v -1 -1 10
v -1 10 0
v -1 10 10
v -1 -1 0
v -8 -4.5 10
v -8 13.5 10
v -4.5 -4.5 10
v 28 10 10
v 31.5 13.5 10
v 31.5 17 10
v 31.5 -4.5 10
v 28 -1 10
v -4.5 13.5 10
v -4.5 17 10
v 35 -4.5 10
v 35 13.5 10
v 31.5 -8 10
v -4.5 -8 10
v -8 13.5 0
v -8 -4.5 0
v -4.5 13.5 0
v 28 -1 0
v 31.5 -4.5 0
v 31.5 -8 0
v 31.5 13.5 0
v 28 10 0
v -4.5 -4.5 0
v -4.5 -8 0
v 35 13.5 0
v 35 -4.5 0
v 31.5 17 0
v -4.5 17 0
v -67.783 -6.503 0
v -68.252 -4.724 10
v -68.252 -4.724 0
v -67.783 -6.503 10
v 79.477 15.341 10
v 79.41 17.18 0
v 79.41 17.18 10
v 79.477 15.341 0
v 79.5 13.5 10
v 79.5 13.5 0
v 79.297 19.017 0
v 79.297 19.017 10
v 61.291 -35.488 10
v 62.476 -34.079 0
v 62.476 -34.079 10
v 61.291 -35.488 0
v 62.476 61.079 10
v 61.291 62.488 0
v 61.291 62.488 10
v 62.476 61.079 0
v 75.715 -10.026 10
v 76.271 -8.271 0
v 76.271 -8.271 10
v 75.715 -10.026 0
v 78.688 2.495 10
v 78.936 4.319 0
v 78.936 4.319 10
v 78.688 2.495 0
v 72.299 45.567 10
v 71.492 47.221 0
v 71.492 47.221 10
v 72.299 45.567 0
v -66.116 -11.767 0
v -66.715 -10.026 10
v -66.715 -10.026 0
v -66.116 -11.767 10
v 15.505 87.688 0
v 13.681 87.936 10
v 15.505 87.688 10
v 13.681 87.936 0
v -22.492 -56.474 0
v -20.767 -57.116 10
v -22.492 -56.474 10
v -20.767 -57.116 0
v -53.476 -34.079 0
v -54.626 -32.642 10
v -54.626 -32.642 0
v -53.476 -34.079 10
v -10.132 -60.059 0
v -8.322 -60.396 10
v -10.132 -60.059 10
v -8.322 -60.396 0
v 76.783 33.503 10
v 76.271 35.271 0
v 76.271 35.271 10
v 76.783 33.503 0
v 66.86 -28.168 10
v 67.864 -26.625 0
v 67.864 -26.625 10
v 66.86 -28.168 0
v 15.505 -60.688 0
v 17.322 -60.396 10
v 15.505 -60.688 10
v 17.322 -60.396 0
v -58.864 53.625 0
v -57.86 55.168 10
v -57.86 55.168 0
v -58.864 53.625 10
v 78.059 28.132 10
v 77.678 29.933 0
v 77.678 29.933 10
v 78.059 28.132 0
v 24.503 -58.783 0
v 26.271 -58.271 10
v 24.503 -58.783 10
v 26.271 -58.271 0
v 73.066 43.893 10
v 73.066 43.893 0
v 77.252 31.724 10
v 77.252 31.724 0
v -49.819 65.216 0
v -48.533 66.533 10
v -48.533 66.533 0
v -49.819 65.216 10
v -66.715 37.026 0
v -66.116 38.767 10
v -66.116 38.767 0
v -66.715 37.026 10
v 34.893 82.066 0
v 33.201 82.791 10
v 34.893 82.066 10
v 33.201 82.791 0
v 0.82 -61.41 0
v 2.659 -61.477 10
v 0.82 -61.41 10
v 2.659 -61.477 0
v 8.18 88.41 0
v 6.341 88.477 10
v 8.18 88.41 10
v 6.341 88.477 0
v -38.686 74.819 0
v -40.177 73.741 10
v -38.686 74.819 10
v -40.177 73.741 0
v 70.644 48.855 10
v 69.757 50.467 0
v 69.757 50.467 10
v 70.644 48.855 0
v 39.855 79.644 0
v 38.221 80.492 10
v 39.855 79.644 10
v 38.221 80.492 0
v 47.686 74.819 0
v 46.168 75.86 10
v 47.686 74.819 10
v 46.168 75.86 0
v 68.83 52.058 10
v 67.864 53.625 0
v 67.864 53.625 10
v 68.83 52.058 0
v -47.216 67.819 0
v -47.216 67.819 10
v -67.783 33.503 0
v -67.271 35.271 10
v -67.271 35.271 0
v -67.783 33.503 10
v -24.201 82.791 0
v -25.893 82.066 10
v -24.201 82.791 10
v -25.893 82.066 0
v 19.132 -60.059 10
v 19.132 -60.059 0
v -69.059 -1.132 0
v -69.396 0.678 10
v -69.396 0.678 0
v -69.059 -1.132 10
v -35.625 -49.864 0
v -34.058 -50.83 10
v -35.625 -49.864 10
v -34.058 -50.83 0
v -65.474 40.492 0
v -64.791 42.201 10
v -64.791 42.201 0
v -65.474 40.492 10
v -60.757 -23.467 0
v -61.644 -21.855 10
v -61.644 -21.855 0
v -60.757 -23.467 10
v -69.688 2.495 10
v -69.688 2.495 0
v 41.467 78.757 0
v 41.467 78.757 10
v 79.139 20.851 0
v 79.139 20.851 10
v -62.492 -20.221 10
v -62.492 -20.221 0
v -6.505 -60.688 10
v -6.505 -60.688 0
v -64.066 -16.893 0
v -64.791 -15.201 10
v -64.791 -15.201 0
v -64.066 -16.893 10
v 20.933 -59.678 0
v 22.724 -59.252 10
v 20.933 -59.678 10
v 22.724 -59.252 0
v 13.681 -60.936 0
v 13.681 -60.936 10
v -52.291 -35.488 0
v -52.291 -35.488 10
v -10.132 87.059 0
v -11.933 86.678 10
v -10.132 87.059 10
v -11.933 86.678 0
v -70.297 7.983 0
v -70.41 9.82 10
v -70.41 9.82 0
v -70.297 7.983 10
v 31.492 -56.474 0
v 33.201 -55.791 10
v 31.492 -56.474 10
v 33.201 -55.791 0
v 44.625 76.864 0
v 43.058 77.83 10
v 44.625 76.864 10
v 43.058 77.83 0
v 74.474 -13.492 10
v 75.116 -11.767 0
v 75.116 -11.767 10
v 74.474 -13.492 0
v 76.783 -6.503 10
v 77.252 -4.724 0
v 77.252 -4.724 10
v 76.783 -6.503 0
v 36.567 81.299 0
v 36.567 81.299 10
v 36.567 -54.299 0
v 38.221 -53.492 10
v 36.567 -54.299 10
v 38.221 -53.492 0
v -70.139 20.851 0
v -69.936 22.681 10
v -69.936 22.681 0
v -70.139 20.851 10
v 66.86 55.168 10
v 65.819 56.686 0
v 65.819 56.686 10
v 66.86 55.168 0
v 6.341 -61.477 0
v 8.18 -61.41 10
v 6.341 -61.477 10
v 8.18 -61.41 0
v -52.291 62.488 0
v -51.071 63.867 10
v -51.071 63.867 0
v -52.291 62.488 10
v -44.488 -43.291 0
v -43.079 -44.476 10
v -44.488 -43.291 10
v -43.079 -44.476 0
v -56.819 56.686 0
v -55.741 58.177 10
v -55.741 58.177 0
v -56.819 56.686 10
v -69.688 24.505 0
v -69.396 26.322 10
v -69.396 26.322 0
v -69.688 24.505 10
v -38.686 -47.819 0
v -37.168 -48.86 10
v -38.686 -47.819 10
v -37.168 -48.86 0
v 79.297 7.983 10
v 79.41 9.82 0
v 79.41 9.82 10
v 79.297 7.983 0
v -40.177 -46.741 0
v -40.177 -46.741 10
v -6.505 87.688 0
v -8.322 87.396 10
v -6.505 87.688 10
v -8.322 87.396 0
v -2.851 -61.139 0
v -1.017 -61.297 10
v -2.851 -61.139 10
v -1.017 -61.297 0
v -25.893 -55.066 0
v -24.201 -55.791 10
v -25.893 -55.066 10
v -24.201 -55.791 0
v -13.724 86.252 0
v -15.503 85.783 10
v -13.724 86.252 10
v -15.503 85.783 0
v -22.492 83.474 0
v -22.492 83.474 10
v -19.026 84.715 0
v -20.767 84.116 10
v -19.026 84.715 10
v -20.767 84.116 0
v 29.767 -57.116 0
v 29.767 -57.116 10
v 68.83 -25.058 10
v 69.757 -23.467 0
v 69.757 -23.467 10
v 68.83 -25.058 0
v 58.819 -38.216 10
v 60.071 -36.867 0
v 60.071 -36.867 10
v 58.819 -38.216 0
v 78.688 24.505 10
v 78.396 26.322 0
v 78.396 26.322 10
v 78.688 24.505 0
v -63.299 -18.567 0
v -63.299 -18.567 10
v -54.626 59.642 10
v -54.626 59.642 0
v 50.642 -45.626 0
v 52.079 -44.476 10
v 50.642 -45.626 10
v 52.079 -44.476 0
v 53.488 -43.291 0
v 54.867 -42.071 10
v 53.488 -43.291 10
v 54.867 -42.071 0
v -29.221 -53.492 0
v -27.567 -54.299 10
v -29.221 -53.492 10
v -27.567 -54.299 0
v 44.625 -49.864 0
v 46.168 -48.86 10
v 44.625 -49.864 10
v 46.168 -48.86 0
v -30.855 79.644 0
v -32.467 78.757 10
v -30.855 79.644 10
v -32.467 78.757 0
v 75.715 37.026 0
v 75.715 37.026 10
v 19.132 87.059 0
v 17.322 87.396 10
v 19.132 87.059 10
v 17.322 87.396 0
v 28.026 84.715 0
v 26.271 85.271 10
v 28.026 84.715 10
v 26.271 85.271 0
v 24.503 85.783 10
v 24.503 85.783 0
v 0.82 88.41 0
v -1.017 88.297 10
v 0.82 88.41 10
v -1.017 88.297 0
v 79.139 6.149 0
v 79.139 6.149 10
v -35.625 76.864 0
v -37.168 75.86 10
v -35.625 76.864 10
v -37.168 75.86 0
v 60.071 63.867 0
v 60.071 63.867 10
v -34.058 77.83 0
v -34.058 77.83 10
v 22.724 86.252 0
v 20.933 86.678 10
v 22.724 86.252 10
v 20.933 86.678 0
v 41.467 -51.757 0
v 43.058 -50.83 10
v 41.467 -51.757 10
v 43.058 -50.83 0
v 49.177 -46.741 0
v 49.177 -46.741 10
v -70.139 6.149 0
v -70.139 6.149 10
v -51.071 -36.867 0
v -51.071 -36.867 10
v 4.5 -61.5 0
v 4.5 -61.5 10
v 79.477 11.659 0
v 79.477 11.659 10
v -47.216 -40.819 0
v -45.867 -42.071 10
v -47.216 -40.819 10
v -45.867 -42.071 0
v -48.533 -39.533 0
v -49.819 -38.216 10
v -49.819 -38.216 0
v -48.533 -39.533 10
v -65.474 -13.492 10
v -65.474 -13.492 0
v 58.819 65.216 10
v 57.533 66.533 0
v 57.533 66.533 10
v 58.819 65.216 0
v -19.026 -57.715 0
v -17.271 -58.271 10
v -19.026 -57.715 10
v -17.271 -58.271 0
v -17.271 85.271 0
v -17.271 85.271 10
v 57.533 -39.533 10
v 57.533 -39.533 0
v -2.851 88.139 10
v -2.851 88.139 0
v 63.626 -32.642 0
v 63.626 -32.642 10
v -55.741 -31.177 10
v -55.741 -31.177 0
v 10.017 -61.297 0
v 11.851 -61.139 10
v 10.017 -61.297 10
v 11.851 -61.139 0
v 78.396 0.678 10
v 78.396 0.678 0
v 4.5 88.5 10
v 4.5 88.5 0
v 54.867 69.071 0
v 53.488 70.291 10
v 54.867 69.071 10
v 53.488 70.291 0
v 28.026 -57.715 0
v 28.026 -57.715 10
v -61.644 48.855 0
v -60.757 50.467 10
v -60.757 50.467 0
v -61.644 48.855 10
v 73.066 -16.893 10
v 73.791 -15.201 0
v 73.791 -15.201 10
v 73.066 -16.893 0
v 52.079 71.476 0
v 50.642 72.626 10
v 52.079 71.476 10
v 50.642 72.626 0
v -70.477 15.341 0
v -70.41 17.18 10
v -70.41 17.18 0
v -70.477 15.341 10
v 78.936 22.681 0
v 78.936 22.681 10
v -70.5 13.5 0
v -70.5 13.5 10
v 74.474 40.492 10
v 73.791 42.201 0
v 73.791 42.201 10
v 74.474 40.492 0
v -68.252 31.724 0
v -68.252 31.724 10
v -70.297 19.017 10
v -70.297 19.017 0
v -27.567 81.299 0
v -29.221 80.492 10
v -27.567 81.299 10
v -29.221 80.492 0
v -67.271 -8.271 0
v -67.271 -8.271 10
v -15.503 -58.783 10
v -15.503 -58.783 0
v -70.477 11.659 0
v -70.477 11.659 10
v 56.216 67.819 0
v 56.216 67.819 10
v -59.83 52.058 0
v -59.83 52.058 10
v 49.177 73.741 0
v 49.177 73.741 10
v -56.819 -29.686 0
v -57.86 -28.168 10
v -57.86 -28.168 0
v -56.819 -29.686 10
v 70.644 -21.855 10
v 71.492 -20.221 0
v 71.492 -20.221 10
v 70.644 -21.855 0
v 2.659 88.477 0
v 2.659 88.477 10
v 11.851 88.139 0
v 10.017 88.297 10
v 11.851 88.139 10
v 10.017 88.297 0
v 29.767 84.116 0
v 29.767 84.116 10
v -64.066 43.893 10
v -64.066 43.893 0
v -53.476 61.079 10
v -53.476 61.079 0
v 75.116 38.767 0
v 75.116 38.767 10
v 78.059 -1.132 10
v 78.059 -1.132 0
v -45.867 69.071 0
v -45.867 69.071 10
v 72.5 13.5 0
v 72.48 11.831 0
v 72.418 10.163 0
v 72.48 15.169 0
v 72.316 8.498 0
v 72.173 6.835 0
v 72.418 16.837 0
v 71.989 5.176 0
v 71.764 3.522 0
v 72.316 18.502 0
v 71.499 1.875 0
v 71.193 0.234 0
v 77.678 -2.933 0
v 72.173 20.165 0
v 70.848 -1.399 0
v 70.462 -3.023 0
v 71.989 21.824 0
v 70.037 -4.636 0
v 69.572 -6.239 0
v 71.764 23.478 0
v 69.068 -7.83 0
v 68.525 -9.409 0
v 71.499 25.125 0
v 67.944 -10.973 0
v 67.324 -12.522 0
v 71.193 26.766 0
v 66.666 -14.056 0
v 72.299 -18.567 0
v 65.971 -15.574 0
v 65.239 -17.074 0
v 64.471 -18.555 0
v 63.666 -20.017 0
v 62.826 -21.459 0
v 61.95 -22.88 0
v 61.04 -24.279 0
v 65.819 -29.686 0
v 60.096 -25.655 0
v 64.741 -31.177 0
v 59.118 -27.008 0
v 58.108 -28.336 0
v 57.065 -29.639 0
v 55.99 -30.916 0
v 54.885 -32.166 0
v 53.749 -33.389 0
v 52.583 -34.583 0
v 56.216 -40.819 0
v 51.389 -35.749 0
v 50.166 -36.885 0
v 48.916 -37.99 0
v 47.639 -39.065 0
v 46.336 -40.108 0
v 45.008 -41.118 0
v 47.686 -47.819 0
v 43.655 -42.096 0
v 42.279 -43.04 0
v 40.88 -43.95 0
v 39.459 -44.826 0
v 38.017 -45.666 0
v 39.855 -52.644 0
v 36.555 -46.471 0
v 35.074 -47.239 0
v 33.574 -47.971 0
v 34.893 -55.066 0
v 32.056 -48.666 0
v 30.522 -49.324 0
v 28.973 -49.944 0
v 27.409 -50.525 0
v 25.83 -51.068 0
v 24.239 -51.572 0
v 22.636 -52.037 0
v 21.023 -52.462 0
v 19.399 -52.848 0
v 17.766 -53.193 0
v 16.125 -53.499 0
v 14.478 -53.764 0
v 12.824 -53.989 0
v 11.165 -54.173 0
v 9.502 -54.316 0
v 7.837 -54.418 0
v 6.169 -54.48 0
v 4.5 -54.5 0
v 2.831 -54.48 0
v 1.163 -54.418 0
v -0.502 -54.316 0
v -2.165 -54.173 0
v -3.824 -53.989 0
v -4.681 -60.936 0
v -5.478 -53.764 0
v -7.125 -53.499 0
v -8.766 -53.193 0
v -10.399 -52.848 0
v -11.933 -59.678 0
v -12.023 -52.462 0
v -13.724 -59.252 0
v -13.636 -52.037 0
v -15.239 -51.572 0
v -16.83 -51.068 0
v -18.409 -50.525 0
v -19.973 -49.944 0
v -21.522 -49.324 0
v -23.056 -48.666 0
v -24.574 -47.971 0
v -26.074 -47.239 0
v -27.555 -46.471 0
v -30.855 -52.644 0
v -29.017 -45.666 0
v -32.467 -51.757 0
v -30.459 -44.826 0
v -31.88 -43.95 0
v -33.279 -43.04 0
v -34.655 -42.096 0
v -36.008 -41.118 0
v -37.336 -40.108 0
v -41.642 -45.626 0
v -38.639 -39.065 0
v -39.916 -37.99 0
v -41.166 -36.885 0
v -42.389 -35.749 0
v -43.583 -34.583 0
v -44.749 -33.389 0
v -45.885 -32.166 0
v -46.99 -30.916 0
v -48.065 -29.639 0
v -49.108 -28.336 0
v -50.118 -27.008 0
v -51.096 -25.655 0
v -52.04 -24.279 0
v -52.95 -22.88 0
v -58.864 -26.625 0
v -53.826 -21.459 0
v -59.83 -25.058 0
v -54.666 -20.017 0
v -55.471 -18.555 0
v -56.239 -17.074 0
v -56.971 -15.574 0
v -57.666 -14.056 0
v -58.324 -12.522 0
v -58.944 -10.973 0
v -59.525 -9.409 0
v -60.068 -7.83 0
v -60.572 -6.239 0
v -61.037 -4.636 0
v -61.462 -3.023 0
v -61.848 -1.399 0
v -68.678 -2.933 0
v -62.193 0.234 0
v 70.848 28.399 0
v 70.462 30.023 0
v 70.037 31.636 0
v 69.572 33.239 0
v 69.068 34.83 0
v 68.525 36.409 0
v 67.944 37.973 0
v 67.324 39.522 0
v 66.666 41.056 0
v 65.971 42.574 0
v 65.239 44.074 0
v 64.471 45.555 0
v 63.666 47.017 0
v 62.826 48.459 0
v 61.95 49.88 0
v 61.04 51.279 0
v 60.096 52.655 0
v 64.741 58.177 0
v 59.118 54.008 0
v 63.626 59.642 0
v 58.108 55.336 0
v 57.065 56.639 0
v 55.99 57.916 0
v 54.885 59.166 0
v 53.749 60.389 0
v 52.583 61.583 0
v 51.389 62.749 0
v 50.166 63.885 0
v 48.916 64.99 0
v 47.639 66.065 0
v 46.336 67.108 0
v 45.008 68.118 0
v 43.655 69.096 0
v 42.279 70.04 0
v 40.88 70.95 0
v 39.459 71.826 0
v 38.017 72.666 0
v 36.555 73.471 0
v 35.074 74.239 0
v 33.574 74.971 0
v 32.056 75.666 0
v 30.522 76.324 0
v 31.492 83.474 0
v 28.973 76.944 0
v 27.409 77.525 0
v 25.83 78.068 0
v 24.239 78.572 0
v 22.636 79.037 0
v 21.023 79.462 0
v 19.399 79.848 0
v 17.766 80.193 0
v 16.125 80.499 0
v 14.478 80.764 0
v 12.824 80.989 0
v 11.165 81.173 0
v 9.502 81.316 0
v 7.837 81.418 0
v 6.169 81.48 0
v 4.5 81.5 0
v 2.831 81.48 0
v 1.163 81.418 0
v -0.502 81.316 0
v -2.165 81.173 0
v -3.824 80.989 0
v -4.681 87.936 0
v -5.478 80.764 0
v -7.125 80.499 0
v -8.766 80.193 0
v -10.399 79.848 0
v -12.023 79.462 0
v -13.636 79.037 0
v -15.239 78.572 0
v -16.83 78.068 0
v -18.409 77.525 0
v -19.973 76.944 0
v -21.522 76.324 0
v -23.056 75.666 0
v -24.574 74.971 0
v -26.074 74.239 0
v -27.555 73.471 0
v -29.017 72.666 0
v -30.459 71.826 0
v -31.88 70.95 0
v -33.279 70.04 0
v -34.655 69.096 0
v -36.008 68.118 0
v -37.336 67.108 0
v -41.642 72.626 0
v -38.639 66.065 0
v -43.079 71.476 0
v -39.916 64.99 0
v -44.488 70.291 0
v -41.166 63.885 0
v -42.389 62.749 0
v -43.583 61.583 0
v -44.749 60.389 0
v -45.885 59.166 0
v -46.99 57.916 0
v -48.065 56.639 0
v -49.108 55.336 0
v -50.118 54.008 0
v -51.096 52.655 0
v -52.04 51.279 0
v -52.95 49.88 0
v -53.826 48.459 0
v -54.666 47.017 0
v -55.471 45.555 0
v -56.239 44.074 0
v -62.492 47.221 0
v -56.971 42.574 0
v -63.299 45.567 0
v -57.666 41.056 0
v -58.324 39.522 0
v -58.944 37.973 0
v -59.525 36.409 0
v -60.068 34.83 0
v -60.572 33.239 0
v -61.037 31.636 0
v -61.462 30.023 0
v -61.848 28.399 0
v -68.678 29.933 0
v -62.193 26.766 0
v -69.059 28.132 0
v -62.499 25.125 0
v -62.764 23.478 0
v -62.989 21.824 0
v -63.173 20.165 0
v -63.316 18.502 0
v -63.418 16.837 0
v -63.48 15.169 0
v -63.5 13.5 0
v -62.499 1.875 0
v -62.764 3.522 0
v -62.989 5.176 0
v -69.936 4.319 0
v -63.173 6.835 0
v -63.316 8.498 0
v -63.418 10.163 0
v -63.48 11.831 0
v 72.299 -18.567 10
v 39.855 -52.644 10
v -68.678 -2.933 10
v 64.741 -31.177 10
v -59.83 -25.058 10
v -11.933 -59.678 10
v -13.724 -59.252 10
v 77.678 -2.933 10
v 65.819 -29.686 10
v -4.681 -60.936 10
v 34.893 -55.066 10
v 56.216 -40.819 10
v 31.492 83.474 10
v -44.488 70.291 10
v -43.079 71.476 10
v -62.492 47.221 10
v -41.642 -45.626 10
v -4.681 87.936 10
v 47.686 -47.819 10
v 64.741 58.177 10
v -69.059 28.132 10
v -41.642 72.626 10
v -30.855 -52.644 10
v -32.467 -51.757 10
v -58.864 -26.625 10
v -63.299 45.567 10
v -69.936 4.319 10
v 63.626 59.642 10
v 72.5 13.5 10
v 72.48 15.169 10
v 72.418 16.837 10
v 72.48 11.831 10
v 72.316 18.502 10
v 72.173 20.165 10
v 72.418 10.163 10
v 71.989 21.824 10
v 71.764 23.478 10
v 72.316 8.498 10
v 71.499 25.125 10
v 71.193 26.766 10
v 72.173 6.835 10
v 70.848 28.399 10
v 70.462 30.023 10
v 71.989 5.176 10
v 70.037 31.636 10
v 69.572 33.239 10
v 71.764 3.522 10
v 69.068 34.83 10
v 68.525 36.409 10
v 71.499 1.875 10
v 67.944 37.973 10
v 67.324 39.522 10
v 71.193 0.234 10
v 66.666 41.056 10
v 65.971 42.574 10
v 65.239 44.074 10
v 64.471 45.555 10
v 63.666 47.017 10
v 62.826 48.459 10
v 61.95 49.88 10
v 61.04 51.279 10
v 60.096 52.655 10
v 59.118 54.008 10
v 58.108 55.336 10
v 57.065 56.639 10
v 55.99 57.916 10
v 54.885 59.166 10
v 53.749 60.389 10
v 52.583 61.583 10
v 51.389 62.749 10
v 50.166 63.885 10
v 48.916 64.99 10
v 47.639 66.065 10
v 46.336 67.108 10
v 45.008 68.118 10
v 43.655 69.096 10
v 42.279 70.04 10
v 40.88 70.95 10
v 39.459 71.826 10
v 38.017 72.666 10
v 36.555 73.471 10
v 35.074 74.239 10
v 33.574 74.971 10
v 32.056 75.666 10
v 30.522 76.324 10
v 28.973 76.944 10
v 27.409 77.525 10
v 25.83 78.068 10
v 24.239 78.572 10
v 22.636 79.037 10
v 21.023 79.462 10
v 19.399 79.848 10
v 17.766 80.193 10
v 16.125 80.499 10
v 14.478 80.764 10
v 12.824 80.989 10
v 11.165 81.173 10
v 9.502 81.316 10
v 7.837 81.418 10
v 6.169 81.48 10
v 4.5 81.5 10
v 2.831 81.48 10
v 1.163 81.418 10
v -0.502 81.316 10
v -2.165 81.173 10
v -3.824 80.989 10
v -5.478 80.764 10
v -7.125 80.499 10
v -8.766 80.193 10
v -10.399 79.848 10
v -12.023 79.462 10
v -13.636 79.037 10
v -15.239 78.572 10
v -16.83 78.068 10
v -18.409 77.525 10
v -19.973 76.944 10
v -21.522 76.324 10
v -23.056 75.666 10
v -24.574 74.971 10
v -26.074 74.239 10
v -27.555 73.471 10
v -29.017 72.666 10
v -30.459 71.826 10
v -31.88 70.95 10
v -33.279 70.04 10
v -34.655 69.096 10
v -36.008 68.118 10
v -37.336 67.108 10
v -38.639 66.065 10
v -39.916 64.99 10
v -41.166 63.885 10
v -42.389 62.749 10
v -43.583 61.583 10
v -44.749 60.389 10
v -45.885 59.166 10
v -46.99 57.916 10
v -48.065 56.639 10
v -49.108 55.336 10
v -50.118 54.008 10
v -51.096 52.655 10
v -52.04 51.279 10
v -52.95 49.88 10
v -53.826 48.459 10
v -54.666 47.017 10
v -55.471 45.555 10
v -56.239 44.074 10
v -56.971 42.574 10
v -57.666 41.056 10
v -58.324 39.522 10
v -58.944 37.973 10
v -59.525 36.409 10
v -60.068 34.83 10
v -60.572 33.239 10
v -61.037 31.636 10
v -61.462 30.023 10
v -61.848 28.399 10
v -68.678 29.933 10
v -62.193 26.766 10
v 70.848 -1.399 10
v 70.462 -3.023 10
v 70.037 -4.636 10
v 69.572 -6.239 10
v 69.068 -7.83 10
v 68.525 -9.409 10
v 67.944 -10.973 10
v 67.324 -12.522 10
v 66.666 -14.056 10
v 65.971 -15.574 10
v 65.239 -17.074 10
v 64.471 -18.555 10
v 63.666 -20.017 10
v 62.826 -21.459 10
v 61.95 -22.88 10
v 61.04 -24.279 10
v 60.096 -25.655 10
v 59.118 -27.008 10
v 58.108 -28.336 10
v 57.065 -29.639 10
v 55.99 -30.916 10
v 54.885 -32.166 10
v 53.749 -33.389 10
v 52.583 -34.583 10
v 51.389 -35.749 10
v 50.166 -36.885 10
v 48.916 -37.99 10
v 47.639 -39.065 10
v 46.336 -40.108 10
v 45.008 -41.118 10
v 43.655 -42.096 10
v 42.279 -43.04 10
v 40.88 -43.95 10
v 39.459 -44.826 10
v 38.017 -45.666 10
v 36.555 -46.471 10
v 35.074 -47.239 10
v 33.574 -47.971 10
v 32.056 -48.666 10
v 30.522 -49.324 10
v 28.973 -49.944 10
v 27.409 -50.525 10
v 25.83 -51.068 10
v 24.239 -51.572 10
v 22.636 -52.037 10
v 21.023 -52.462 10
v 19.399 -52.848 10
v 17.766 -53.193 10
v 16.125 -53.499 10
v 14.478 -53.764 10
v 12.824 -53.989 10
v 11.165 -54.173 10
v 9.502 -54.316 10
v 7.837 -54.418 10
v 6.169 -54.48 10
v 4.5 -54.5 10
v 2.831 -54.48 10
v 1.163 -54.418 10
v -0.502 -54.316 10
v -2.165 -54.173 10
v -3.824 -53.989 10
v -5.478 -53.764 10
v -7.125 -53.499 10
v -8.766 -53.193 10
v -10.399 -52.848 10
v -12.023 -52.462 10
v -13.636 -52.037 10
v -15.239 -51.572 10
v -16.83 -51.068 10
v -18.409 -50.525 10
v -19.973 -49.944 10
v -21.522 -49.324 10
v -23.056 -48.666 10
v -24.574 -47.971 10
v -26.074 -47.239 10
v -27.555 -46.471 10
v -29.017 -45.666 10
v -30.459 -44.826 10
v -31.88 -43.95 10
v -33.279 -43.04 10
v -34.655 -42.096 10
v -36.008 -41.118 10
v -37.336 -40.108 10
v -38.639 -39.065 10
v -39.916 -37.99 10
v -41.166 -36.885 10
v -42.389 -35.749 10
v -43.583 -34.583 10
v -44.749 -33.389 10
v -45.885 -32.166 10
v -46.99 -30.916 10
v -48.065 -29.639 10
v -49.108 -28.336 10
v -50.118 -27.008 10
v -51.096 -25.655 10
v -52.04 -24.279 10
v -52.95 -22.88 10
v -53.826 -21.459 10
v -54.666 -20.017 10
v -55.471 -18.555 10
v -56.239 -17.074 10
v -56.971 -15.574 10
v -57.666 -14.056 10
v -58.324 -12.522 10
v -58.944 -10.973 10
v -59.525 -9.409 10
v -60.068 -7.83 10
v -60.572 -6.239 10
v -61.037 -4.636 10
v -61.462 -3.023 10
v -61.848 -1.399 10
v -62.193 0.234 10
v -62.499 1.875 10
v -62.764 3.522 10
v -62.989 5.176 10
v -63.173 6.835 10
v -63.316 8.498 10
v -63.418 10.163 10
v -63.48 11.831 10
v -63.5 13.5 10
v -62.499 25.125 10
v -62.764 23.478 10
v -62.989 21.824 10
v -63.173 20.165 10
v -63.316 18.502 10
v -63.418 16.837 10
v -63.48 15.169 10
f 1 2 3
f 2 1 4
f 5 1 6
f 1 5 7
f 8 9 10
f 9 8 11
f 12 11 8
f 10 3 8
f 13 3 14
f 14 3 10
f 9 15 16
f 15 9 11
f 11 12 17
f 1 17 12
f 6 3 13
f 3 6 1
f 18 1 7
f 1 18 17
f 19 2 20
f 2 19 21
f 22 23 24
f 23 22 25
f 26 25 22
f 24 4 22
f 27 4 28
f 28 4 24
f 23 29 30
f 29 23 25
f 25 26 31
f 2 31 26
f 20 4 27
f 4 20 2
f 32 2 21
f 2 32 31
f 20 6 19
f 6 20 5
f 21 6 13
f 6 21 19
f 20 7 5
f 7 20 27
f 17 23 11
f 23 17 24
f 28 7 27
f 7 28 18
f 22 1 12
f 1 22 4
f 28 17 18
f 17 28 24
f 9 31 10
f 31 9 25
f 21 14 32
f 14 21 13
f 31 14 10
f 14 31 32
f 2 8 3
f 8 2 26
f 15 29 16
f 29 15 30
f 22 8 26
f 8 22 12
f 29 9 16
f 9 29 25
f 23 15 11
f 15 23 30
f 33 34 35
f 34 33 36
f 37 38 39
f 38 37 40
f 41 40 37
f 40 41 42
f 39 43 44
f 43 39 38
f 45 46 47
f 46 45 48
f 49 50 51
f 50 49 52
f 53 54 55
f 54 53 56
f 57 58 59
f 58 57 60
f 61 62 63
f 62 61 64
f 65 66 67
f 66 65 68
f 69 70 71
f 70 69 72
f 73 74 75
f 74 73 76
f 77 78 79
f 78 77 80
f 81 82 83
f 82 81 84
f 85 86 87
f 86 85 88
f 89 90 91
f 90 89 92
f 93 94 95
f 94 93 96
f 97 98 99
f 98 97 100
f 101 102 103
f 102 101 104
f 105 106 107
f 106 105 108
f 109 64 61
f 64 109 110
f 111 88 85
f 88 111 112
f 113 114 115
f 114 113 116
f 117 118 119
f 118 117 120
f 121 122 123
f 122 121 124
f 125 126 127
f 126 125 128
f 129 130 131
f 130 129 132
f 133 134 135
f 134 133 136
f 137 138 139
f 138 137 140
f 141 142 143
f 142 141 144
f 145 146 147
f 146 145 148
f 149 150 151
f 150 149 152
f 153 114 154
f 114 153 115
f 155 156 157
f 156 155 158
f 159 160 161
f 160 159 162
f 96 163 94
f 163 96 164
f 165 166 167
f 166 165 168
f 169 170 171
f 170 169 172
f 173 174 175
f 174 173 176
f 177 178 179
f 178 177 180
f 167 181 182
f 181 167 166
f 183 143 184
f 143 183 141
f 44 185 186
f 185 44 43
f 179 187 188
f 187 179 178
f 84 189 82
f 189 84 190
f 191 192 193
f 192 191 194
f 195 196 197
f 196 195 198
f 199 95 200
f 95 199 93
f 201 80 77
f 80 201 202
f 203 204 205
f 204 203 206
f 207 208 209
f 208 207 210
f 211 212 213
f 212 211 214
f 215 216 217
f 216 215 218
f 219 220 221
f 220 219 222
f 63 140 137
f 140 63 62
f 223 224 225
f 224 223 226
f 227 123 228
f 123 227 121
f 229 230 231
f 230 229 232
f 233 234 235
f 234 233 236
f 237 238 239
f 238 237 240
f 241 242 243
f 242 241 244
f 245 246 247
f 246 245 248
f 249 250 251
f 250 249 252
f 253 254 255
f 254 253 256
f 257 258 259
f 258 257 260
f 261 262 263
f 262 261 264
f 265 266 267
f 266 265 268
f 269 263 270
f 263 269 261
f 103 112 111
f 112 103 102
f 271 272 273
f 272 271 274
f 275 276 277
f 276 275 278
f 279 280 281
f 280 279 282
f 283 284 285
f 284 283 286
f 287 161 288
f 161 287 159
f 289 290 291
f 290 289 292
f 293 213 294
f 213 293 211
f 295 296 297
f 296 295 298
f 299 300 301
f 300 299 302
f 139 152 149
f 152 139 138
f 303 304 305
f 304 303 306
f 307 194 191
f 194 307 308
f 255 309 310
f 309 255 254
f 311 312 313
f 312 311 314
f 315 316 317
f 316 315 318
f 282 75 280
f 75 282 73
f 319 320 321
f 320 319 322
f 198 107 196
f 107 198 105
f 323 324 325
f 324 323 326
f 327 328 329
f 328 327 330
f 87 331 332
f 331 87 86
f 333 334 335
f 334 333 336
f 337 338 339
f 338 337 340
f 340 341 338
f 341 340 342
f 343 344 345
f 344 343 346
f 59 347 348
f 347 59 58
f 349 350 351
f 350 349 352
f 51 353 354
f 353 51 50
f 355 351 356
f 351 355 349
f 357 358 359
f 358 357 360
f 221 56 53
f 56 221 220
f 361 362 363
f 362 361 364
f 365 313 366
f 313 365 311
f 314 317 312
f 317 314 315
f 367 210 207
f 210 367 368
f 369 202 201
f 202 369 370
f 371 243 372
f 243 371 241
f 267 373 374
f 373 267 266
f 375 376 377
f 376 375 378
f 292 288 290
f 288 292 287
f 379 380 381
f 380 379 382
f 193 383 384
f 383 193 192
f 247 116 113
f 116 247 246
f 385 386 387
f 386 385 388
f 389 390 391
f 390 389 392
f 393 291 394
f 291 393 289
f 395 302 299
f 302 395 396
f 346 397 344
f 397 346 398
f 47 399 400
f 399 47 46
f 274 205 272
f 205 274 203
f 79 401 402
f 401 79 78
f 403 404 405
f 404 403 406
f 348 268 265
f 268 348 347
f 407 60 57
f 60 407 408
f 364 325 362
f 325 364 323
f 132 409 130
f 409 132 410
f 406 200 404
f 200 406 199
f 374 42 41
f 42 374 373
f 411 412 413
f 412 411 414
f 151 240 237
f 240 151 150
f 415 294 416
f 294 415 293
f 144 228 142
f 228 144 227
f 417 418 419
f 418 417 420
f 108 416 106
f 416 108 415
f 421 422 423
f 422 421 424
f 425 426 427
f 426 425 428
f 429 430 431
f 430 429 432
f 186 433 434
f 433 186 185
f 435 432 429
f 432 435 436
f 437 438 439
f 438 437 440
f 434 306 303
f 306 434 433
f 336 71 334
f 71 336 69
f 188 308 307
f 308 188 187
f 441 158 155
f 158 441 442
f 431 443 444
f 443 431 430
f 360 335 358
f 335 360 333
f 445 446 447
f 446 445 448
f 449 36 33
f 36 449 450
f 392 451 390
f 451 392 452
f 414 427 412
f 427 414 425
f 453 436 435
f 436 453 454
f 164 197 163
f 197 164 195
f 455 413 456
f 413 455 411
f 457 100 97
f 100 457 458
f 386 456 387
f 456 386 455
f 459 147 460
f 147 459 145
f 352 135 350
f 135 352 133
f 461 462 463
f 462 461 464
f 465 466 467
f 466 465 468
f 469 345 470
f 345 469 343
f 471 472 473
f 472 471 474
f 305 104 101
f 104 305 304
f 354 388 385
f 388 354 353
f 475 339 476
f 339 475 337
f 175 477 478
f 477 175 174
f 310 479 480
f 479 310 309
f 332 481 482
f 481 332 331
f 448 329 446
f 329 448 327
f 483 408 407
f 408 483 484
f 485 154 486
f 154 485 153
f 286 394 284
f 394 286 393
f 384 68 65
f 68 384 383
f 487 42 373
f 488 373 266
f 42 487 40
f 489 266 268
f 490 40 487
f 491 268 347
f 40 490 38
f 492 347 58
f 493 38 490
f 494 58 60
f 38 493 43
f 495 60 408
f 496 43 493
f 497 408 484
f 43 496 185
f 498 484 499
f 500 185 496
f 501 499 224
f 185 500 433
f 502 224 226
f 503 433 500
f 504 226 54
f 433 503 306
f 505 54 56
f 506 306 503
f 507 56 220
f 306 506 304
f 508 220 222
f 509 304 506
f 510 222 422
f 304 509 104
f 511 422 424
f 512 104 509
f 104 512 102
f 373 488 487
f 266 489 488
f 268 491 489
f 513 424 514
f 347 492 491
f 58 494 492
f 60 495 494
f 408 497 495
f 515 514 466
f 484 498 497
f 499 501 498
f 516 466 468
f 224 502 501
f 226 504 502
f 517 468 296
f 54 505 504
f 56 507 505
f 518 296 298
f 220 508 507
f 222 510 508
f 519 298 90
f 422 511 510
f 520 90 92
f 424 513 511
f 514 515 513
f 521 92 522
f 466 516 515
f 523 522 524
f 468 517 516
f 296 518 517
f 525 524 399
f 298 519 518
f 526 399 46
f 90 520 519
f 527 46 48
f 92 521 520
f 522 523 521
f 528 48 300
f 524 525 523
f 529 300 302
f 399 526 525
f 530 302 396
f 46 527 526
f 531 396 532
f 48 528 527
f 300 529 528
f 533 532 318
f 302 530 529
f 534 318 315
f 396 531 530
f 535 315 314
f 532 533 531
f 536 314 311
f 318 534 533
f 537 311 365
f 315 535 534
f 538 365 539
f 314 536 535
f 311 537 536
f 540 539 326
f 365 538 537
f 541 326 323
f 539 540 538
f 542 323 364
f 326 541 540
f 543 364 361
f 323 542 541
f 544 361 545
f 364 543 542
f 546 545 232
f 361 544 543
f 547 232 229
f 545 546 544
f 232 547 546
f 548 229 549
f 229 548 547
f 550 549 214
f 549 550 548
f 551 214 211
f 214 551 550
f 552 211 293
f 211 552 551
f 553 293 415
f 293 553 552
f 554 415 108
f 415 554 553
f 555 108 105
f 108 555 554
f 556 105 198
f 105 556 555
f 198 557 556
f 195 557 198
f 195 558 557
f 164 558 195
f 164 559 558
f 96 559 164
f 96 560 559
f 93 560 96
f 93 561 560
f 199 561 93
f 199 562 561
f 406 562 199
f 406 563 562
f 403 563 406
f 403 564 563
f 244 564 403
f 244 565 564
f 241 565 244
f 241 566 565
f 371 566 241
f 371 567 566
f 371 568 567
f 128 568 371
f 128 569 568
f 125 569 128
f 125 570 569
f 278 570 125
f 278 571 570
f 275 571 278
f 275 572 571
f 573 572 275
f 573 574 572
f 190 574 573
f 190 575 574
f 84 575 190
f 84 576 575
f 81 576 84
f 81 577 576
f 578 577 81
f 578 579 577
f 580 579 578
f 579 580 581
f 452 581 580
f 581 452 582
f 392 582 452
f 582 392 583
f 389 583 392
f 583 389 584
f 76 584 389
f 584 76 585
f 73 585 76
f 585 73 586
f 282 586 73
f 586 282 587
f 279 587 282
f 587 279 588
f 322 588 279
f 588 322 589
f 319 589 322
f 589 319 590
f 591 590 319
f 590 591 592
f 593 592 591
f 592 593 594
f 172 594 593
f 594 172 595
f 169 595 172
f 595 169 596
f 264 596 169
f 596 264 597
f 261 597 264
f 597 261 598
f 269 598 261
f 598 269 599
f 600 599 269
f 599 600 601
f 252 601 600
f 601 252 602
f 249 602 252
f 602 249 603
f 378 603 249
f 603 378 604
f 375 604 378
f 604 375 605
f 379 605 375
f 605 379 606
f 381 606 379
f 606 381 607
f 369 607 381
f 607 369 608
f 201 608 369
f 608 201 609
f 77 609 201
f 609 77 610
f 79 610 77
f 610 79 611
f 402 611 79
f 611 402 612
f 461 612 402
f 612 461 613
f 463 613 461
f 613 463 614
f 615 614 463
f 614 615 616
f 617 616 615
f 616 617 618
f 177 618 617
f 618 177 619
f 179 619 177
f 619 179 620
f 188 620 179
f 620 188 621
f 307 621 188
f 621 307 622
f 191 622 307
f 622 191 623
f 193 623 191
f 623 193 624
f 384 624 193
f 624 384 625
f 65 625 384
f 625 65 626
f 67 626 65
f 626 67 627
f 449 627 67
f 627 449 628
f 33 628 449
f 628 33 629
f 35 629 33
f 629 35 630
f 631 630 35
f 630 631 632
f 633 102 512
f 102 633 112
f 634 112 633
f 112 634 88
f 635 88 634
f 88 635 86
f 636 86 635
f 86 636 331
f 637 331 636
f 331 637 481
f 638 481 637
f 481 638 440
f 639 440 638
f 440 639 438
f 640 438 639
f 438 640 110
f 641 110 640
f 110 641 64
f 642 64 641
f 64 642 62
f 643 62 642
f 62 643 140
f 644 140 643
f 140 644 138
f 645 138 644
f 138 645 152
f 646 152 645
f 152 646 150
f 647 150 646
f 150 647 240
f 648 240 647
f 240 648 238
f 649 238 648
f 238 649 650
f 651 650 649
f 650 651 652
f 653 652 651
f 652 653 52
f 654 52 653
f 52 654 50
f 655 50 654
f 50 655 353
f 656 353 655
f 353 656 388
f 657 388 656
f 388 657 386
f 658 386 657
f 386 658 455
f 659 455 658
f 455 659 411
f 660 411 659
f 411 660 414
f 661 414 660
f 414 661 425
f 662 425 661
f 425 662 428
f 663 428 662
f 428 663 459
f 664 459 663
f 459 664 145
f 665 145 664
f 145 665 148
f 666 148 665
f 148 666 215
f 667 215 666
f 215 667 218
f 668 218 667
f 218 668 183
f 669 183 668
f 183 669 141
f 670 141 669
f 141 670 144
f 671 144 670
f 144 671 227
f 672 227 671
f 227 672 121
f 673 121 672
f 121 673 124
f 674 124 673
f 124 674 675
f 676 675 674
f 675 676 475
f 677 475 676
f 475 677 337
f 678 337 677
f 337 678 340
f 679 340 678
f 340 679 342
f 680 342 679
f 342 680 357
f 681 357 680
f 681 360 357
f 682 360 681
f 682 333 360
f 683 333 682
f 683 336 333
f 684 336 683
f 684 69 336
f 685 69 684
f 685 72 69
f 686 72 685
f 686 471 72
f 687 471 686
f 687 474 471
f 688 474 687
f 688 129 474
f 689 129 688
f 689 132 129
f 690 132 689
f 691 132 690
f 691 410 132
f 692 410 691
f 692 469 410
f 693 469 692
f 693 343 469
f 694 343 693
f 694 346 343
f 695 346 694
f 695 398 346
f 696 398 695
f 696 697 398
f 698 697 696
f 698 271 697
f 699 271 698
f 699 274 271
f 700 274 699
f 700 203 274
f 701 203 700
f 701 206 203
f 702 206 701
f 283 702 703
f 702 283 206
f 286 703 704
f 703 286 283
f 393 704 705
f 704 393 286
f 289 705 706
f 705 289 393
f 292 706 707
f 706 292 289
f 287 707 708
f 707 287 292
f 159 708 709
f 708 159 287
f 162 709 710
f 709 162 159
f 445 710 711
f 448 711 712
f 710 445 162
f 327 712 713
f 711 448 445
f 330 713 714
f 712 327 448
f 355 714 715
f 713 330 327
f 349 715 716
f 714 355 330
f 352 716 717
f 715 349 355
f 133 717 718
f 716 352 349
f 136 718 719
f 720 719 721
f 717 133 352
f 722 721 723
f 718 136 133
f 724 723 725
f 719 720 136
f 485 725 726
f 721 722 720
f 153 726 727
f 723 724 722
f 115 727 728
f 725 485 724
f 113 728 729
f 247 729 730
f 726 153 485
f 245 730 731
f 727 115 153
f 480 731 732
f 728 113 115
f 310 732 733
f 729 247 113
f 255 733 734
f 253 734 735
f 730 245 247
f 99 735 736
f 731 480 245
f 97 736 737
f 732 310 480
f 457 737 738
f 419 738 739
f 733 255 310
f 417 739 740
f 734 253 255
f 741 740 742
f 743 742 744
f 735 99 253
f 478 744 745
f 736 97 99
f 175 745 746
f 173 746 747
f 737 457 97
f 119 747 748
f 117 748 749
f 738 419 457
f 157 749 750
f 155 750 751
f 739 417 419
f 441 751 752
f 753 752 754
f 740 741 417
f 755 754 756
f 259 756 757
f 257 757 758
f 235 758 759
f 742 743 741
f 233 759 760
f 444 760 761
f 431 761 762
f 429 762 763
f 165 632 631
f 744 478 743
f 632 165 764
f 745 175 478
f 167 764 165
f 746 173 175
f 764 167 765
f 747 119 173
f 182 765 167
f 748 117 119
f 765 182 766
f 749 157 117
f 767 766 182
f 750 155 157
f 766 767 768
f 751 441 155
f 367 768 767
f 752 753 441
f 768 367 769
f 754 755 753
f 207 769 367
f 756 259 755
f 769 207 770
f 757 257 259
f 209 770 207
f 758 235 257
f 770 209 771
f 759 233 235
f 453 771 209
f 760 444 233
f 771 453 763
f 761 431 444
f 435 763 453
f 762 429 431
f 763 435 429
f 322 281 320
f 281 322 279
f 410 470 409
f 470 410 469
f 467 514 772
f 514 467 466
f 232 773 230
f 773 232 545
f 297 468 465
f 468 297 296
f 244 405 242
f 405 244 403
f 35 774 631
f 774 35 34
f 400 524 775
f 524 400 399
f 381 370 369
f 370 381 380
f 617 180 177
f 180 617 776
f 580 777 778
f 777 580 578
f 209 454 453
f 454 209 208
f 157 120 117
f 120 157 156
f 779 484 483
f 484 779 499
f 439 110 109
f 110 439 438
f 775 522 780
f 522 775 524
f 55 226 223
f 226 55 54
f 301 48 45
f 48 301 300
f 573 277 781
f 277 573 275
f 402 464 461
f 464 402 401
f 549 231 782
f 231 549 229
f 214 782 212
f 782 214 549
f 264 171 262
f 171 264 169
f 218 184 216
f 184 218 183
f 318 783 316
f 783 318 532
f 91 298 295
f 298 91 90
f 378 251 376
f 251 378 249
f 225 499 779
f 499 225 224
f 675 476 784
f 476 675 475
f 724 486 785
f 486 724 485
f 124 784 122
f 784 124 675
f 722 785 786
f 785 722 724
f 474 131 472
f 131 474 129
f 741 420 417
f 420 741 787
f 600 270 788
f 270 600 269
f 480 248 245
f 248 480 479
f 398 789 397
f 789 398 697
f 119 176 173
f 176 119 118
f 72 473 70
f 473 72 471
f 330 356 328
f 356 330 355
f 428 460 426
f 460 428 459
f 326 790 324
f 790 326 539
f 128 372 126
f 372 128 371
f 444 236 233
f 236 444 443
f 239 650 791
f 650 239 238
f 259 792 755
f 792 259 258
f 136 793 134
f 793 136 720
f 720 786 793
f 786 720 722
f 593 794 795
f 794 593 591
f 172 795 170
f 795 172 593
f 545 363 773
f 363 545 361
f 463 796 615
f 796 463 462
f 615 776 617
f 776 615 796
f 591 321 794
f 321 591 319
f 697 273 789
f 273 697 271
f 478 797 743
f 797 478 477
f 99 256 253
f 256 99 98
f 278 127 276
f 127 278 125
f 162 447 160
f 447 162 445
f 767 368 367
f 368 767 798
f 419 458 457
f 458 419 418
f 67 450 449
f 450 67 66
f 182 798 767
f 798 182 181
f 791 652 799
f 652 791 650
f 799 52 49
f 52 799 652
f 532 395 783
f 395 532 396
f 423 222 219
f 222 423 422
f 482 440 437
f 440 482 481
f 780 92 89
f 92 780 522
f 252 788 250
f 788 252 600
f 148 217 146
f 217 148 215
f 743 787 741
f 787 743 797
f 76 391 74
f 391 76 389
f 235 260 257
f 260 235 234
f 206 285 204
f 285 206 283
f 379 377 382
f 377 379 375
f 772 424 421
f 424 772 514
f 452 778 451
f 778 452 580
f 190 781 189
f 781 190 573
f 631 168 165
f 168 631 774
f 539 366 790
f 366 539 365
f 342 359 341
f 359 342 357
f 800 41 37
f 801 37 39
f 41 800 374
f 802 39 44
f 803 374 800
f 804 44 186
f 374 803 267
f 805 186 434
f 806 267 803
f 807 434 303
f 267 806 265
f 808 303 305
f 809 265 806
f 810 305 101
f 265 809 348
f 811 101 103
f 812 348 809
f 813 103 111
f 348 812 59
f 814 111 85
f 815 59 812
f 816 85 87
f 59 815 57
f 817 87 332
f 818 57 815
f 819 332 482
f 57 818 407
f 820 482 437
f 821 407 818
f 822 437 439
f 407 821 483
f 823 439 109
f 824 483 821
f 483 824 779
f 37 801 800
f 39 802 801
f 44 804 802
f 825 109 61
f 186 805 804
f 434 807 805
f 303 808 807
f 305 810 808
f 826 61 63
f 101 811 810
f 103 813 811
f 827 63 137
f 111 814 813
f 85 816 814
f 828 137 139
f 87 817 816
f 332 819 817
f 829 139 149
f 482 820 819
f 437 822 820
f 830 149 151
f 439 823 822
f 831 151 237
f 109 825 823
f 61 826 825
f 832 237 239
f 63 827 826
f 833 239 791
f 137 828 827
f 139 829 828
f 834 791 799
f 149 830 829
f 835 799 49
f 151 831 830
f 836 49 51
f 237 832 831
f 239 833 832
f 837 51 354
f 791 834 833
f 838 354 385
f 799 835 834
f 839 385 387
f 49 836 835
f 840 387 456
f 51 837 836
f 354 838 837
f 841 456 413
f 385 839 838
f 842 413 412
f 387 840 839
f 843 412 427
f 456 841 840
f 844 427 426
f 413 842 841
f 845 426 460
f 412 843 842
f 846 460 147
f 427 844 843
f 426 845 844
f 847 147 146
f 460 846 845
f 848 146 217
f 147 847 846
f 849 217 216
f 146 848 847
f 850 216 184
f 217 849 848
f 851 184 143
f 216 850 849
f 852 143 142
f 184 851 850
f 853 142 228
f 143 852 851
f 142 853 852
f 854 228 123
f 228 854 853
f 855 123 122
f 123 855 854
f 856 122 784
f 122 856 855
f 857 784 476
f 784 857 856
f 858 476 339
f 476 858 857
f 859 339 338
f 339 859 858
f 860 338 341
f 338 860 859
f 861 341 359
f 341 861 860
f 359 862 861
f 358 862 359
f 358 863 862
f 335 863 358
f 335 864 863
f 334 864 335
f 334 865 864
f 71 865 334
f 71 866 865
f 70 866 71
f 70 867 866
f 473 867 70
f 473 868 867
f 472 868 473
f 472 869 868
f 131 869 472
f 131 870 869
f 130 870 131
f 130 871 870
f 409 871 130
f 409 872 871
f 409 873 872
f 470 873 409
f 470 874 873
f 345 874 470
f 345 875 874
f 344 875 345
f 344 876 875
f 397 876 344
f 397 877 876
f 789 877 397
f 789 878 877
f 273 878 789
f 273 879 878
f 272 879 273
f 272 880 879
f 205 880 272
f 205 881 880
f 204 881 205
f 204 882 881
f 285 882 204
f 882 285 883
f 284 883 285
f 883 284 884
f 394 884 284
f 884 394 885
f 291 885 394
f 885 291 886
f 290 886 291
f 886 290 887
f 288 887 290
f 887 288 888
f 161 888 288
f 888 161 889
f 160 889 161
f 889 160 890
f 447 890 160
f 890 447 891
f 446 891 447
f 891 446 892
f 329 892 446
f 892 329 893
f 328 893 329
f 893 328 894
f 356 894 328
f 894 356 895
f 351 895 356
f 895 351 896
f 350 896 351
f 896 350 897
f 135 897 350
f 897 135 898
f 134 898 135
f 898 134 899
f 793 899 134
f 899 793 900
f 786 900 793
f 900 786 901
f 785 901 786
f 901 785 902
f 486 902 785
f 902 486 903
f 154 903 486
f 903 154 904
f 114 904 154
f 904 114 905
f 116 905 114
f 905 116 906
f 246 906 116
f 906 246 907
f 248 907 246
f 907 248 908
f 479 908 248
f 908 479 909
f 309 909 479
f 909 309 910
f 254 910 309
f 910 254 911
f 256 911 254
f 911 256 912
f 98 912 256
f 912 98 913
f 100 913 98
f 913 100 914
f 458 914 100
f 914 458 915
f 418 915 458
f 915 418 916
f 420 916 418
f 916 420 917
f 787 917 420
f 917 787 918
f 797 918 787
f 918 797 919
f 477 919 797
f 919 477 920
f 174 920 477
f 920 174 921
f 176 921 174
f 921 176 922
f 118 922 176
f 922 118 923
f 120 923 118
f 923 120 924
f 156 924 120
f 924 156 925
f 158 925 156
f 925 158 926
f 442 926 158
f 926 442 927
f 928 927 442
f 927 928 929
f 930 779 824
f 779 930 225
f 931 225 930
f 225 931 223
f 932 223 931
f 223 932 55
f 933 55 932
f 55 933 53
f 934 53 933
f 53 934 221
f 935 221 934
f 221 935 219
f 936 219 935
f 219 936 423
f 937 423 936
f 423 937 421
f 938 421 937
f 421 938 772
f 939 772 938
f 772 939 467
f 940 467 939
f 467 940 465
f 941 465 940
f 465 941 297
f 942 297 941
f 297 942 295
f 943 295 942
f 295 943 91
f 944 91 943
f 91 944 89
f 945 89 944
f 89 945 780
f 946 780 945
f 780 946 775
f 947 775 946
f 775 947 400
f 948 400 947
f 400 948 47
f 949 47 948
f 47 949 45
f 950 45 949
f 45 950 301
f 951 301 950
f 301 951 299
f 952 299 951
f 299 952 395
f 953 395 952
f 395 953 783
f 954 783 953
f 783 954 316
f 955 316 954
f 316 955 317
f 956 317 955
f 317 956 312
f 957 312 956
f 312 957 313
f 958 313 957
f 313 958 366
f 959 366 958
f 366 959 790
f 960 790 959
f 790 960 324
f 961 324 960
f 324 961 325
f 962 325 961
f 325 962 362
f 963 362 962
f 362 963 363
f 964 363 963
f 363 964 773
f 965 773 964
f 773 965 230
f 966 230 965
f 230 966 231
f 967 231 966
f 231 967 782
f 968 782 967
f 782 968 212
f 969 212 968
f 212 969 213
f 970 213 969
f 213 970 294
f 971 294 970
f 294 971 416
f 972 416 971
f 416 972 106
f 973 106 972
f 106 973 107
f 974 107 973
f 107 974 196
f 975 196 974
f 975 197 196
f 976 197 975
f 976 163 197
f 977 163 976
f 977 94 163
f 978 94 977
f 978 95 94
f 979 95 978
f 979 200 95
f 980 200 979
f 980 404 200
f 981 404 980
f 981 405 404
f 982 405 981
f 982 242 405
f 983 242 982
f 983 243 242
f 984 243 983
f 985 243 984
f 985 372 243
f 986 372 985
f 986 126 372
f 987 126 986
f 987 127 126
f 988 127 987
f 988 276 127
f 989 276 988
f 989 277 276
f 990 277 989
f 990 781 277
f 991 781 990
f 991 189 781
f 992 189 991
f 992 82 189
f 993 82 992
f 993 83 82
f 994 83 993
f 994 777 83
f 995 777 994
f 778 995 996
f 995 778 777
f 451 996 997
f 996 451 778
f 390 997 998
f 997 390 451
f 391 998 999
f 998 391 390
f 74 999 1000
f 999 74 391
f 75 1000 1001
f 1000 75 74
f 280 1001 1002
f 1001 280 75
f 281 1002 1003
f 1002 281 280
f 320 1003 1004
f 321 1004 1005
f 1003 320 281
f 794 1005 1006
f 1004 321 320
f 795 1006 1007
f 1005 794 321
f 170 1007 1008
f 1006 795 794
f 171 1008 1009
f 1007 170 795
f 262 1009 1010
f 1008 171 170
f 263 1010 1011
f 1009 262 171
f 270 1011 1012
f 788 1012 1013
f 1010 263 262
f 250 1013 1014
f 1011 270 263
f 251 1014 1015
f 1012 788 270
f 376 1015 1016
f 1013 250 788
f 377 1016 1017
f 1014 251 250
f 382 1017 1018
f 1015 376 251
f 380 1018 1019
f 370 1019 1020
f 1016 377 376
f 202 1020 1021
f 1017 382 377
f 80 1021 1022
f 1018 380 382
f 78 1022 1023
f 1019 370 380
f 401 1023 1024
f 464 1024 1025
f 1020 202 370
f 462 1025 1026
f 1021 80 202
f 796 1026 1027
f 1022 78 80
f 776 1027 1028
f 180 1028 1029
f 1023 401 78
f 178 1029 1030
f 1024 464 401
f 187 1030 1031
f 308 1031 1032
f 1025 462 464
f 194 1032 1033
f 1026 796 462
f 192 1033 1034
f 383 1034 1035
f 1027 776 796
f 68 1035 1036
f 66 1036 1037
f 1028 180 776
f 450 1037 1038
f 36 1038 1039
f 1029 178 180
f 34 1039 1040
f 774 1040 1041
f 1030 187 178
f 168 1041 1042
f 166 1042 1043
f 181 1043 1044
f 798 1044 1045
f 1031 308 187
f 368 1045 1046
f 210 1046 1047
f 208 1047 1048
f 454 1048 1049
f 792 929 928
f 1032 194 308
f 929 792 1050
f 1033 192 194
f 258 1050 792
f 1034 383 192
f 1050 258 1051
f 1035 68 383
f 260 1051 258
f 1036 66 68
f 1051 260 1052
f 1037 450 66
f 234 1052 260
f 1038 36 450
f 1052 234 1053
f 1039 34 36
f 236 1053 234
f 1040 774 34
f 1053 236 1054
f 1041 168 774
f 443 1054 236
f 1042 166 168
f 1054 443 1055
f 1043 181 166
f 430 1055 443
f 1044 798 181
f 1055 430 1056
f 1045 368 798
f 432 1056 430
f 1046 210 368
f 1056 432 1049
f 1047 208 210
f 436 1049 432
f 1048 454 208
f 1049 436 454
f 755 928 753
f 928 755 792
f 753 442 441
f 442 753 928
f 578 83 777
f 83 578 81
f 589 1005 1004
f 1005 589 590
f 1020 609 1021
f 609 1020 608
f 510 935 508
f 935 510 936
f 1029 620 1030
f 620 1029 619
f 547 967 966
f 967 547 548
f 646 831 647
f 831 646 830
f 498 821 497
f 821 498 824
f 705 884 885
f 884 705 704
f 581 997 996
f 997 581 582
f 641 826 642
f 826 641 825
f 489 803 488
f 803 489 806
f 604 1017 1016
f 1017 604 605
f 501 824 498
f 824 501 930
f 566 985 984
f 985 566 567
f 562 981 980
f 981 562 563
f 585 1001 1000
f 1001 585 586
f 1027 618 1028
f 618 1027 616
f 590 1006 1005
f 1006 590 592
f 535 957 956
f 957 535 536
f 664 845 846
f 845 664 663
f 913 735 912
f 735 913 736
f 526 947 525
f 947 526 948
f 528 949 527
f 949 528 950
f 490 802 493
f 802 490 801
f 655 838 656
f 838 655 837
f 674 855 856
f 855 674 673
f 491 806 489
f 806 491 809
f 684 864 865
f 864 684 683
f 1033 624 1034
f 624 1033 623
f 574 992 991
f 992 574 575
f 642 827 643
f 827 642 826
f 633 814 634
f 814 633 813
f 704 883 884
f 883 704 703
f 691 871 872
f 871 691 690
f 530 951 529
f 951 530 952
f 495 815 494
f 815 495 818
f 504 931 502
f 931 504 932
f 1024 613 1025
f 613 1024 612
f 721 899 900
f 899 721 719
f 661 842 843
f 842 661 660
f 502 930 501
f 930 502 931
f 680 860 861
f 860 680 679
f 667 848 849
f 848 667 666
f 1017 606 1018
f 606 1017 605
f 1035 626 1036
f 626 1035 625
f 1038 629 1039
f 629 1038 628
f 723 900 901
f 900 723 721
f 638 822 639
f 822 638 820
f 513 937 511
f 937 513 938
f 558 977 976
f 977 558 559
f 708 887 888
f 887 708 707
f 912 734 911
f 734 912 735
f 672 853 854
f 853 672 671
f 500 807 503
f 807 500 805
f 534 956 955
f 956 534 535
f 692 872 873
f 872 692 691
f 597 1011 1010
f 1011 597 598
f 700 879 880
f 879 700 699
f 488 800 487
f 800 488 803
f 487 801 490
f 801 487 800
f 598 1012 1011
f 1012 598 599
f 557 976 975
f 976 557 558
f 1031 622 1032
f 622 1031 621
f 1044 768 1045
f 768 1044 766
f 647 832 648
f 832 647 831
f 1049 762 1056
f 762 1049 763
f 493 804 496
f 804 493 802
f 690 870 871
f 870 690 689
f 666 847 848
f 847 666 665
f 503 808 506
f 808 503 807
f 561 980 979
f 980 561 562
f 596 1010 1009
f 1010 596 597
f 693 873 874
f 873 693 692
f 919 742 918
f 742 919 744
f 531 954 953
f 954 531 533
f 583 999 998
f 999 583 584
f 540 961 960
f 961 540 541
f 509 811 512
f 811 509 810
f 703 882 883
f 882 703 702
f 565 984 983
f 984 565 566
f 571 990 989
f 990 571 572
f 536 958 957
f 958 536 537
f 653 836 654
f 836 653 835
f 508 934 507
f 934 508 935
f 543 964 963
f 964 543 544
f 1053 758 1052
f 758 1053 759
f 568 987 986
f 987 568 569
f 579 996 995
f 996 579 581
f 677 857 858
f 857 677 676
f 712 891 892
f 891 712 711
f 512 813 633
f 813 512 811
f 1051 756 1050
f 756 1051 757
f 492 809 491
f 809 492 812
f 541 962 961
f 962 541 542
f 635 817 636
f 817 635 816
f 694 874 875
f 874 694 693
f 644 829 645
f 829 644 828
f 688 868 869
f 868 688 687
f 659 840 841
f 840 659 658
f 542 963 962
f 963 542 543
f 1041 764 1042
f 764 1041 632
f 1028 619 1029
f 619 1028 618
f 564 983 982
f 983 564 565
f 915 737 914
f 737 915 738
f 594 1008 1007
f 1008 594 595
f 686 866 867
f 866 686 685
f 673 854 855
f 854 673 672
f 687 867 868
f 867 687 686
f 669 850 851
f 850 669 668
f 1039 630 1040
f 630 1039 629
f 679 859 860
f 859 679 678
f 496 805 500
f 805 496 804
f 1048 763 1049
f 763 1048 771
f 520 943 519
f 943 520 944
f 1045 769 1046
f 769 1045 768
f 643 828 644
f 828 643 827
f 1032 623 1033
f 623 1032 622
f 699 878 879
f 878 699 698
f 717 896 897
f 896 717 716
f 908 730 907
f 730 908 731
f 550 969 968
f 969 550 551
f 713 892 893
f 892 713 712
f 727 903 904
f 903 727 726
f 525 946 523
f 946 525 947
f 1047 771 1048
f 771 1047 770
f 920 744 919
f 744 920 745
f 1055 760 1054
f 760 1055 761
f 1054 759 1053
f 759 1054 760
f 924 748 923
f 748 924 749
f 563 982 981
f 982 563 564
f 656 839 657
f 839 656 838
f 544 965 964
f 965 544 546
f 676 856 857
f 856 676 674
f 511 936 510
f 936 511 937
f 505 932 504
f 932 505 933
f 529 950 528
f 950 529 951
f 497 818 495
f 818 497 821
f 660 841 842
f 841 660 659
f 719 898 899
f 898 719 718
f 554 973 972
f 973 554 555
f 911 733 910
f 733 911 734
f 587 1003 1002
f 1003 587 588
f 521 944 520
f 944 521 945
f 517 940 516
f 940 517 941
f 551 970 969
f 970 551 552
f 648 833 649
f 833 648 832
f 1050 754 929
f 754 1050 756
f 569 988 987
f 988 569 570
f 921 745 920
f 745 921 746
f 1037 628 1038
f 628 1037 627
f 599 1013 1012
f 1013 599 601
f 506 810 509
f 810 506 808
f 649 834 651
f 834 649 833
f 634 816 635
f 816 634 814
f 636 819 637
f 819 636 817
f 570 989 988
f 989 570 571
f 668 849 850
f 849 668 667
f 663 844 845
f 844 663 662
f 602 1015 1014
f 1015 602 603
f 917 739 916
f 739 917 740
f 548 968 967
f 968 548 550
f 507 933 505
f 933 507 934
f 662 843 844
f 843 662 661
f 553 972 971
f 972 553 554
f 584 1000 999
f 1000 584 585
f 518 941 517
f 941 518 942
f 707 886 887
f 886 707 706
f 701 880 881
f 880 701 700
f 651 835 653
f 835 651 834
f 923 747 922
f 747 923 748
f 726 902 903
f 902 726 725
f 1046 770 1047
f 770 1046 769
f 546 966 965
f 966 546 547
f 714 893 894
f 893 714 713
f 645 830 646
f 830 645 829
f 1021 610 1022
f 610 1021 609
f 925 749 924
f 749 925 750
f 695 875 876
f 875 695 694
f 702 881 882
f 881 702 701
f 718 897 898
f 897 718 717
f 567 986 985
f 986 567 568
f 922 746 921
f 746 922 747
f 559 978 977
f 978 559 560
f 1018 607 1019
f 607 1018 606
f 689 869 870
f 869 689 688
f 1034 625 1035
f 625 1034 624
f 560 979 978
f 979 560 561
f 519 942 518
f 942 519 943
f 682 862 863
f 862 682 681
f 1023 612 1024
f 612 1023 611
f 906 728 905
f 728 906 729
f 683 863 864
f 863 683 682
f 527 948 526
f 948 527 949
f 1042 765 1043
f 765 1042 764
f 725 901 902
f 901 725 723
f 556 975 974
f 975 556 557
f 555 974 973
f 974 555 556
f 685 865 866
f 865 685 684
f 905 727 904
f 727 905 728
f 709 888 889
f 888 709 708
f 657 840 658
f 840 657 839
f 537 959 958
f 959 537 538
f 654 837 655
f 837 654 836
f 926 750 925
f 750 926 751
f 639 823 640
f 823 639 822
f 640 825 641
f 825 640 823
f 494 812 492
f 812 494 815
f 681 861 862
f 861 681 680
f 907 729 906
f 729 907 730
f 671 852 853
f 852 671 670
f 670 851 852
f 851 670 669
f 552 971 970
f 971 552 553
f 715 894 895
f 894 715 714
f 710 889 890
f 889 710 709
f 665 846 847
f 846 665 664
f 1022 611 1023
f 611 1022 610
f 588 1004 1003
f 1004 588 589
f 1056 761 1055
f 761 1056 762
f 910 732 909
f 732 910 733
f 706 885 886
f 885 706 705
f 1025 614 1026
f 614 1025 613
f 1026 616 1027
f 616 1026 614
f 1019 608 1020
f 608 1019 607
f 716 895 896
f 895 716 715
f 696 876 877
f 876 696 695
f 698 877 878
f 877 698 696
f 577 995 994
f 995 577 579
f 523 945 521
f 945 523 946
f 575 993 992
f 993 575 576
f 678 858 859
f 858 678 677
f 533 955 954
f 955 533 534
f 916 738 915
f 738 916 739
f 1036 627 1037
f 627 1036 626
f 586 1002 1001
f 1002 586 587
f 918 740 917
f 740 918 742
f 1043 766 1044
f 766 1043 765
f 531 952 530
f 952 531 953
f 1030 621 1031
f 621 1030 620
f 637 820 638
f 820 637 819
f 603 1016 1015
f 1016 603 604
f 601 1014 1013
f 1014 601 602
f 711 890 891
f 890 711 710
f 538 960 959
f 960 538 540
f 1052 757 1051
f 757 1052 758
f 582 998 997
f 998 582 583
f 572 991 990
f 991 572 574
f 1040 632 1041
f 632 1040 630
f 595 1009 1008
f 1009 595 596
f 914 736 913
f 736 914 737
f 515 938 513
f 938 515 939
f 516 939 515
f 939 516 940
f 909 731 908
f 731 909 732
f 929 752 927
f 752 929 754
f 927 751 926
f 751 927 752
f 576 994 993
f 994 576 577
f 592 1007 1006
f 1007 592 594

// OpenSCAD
// Generated by SolidPython 1.1.3 on 2026-06-23 12:53:50


union() {
	union() {
		translate(v = [-4.5000000000, 4.5000000000, 5.0000000000]) {
			cube(center = true, size = [7, 18, 10]);
		}
		translate(v = [13.5000000000, -4.5000000000, 5.0000000000]) {
			cube(center = true, size = [36, 7, 10]);
		}
		translate(v = [0, 18]) {
			translate(v = [13.5000000000, -4.5000000000, 5.0000000000]) {
				cube(center = true, size = [36, 7, 10]);
			}
		}
		translate(v = [36, 0]) {
			translate(v = [-4.5000000000, 4.5000000000, 5.0000000000]) {
				cube(center = true, size = [7, 18, 10]);
			}
		}
	}
	translate(v = [4.5000000000, 13.5000000000]) {
		difference() {
			cylinder($fn = 256, h = 10, r = 75.0000000000);
			cylinder($fn = 256, h = 10, r = 68.0000000000);
		}
	}
}
/***********************************************
*********      SolidPython code:      **********
************************************************

"""SCAD file export functions.

This module provides functions for exporting OpenSCAD geometries to .scad files.
"""

from typing import Dict, Optional
from pathlib import Path
import solid

from .config import ExportConfiguration, FileNamingConfig


def export_scad(
    geometry: solid.OpenSCADObject, output_path: Path, header: Optional[str] = None
) -> Path:
    """Export geometry to SCAD file.

    Parameters
    ----------
    geometry : solid.OpenSCADObject
        Geometry to export.
    output_path : Path
        Output file path.
    header : str, optional
        Header comment to add to SCAD file.

    Returns
    -------
    Path
        Path to created SCAD file.

    Raises
    ------
    IOError
        If file cannot be written.

    Examples
    --------
    >>> from pathlib import Path
    >>> import solid
    >>>
    >>> geometry = solid.cube([10, 10, 10])
    >>> output_path = Path('output/device.scad')
    >>> export_scad(geometry, output_path)
    """
    # Ensure parent directory exists
    output_path.parent.mkdir(parents=True, exist_ok=True)

    # Render to file
    try:
        solid.scad_render_to_file(geometry, str(output_path))
    except Exception as e:
        raise IOError(f"Failed to write SCAD file to {output_path}: {e}")

    _normalize_scad_file(output_path)

    # Add header if provided
    if header:
        _add_header_to_scad(output_path, header)
        _normalize_scad_file(output_path)

    return output_path


def _normalize_scad_file(scad_path: Path) -> None:
    """Strip trailing whitespace from generated SCAD text."""
    content = scad_path.read_text()
    normalized = "\n".join(line.rstrip() for line in content.splitlines()) + "\n"
    if normalized != content:
        scad_path.write_text(normalized)


def export_multiple_scad(
    geometries: Dict[str, solid.OpenSCADObject],
    config: ExportConfiguration,
    naming_config: Optional[FileNamingConfig] = None,
) -> Dict[str, Path]:
    """Export multiple geometries to SCAD files.

    Parameters
    ----------
    geometries : dict
        Dictionary mapping prefixes to geometries.
        Keys are used as filename prefixes.
    config : ExportConfiguration
        Export configuration.
    naming_config : FileNamingConfig, optional
        File naming configuration.

    Returns
    -------
    dict
        Dictionary mapping prefixes to output paths.

    Examples
    --------
    >>> geometries = {
    ...     'wells': wells_geometry,
    ...     'channels': channels_geometry,
    ...     'device': device_geometry
    ... }
    >>> config = ExportConfiguration(output_directory=Path('output'))
    >>> paths = export_multiple_scad(geometries, config)
    """
    output_paths = {}

    for prefix, geometry in geometries.items():
        # Create naming config for this geometry
        if naming_config:
            file_config = FileNamingConfig(
                prefix=prefix,
                version=naming_config.version,
                grid_size=naming_config.grid_size,
                suffix=naming_config.suffix,
            )
        else:
            file_config = FileNamingConfig(prefix=prefix)

        # Generate filename
        filename = file_config.generate_filename("scad")
        output_path = config.get_output_path(filename)

        # Export
        export_scad(geometry, output_path)
        output_paths[prefix] = output_path

    return output_paths


def _add_header_to_scad(scad_path: Path, header: str):
    """Add header comment to existing SCAD file.

    Parameters
    ----------
    scad_path : Path
        Path to SCAD file.
    header : str
        Header text to add.
    """
    # Read existing content
    with open(scad_path, "r") as f:
        content = f.read()

    # Prepend header
    header_comment = f"// {header}\n\n"
    with open(scad_path, "w") as f:
        f.write(header_comment + content)


def generate_scad_header(
    device_name: str, version: Optional[str] = None, description: Optional[str] = None
) -> str:
    """Generate SCAD file header comment.

    Parameters
    ----------
    device_name : str
        Device name.
    version : str, optional
        Version string.
    description : str, optional
        Device description.

    Returns
    -------
    str
        Header comment text.

    Examples
    --------
    >>> header = generate_scad_header(
    ...     'Two Compartment Device',
    ...     version='v1',
    ...     description='96-well format with microchannels'
    ... )
    """
    lines = []
    lines.append("=" * 60)
    lines.append(f"Device: {device_name}")

    if version:
        lines.append(f"Version: {version}")

    if description:
        lines.append(f"Description: {description}")

    lines.append("Generated by OpenMFD")
    lines.append("=" * 60)

    return "\n".join(lines)


def validate_scad_file(scad_path: Path) -> bool:
    """Validate that SCAD file exists and is readable.

    Parameters
    ----------
    scad_path : Path
        Path to SCAD file.

    Returns
    -------
    bool
        True if file is valid, False otherwise.
    """
    if not scad_path.exists():
        return False

    if not scad_path.is_file():
        return False

    # Try to read file
    try:
        with open(scad_path, "r") as f:
            content = f.read()
        return len(content) > 0
    except Exception:
        return False


************************************************/
